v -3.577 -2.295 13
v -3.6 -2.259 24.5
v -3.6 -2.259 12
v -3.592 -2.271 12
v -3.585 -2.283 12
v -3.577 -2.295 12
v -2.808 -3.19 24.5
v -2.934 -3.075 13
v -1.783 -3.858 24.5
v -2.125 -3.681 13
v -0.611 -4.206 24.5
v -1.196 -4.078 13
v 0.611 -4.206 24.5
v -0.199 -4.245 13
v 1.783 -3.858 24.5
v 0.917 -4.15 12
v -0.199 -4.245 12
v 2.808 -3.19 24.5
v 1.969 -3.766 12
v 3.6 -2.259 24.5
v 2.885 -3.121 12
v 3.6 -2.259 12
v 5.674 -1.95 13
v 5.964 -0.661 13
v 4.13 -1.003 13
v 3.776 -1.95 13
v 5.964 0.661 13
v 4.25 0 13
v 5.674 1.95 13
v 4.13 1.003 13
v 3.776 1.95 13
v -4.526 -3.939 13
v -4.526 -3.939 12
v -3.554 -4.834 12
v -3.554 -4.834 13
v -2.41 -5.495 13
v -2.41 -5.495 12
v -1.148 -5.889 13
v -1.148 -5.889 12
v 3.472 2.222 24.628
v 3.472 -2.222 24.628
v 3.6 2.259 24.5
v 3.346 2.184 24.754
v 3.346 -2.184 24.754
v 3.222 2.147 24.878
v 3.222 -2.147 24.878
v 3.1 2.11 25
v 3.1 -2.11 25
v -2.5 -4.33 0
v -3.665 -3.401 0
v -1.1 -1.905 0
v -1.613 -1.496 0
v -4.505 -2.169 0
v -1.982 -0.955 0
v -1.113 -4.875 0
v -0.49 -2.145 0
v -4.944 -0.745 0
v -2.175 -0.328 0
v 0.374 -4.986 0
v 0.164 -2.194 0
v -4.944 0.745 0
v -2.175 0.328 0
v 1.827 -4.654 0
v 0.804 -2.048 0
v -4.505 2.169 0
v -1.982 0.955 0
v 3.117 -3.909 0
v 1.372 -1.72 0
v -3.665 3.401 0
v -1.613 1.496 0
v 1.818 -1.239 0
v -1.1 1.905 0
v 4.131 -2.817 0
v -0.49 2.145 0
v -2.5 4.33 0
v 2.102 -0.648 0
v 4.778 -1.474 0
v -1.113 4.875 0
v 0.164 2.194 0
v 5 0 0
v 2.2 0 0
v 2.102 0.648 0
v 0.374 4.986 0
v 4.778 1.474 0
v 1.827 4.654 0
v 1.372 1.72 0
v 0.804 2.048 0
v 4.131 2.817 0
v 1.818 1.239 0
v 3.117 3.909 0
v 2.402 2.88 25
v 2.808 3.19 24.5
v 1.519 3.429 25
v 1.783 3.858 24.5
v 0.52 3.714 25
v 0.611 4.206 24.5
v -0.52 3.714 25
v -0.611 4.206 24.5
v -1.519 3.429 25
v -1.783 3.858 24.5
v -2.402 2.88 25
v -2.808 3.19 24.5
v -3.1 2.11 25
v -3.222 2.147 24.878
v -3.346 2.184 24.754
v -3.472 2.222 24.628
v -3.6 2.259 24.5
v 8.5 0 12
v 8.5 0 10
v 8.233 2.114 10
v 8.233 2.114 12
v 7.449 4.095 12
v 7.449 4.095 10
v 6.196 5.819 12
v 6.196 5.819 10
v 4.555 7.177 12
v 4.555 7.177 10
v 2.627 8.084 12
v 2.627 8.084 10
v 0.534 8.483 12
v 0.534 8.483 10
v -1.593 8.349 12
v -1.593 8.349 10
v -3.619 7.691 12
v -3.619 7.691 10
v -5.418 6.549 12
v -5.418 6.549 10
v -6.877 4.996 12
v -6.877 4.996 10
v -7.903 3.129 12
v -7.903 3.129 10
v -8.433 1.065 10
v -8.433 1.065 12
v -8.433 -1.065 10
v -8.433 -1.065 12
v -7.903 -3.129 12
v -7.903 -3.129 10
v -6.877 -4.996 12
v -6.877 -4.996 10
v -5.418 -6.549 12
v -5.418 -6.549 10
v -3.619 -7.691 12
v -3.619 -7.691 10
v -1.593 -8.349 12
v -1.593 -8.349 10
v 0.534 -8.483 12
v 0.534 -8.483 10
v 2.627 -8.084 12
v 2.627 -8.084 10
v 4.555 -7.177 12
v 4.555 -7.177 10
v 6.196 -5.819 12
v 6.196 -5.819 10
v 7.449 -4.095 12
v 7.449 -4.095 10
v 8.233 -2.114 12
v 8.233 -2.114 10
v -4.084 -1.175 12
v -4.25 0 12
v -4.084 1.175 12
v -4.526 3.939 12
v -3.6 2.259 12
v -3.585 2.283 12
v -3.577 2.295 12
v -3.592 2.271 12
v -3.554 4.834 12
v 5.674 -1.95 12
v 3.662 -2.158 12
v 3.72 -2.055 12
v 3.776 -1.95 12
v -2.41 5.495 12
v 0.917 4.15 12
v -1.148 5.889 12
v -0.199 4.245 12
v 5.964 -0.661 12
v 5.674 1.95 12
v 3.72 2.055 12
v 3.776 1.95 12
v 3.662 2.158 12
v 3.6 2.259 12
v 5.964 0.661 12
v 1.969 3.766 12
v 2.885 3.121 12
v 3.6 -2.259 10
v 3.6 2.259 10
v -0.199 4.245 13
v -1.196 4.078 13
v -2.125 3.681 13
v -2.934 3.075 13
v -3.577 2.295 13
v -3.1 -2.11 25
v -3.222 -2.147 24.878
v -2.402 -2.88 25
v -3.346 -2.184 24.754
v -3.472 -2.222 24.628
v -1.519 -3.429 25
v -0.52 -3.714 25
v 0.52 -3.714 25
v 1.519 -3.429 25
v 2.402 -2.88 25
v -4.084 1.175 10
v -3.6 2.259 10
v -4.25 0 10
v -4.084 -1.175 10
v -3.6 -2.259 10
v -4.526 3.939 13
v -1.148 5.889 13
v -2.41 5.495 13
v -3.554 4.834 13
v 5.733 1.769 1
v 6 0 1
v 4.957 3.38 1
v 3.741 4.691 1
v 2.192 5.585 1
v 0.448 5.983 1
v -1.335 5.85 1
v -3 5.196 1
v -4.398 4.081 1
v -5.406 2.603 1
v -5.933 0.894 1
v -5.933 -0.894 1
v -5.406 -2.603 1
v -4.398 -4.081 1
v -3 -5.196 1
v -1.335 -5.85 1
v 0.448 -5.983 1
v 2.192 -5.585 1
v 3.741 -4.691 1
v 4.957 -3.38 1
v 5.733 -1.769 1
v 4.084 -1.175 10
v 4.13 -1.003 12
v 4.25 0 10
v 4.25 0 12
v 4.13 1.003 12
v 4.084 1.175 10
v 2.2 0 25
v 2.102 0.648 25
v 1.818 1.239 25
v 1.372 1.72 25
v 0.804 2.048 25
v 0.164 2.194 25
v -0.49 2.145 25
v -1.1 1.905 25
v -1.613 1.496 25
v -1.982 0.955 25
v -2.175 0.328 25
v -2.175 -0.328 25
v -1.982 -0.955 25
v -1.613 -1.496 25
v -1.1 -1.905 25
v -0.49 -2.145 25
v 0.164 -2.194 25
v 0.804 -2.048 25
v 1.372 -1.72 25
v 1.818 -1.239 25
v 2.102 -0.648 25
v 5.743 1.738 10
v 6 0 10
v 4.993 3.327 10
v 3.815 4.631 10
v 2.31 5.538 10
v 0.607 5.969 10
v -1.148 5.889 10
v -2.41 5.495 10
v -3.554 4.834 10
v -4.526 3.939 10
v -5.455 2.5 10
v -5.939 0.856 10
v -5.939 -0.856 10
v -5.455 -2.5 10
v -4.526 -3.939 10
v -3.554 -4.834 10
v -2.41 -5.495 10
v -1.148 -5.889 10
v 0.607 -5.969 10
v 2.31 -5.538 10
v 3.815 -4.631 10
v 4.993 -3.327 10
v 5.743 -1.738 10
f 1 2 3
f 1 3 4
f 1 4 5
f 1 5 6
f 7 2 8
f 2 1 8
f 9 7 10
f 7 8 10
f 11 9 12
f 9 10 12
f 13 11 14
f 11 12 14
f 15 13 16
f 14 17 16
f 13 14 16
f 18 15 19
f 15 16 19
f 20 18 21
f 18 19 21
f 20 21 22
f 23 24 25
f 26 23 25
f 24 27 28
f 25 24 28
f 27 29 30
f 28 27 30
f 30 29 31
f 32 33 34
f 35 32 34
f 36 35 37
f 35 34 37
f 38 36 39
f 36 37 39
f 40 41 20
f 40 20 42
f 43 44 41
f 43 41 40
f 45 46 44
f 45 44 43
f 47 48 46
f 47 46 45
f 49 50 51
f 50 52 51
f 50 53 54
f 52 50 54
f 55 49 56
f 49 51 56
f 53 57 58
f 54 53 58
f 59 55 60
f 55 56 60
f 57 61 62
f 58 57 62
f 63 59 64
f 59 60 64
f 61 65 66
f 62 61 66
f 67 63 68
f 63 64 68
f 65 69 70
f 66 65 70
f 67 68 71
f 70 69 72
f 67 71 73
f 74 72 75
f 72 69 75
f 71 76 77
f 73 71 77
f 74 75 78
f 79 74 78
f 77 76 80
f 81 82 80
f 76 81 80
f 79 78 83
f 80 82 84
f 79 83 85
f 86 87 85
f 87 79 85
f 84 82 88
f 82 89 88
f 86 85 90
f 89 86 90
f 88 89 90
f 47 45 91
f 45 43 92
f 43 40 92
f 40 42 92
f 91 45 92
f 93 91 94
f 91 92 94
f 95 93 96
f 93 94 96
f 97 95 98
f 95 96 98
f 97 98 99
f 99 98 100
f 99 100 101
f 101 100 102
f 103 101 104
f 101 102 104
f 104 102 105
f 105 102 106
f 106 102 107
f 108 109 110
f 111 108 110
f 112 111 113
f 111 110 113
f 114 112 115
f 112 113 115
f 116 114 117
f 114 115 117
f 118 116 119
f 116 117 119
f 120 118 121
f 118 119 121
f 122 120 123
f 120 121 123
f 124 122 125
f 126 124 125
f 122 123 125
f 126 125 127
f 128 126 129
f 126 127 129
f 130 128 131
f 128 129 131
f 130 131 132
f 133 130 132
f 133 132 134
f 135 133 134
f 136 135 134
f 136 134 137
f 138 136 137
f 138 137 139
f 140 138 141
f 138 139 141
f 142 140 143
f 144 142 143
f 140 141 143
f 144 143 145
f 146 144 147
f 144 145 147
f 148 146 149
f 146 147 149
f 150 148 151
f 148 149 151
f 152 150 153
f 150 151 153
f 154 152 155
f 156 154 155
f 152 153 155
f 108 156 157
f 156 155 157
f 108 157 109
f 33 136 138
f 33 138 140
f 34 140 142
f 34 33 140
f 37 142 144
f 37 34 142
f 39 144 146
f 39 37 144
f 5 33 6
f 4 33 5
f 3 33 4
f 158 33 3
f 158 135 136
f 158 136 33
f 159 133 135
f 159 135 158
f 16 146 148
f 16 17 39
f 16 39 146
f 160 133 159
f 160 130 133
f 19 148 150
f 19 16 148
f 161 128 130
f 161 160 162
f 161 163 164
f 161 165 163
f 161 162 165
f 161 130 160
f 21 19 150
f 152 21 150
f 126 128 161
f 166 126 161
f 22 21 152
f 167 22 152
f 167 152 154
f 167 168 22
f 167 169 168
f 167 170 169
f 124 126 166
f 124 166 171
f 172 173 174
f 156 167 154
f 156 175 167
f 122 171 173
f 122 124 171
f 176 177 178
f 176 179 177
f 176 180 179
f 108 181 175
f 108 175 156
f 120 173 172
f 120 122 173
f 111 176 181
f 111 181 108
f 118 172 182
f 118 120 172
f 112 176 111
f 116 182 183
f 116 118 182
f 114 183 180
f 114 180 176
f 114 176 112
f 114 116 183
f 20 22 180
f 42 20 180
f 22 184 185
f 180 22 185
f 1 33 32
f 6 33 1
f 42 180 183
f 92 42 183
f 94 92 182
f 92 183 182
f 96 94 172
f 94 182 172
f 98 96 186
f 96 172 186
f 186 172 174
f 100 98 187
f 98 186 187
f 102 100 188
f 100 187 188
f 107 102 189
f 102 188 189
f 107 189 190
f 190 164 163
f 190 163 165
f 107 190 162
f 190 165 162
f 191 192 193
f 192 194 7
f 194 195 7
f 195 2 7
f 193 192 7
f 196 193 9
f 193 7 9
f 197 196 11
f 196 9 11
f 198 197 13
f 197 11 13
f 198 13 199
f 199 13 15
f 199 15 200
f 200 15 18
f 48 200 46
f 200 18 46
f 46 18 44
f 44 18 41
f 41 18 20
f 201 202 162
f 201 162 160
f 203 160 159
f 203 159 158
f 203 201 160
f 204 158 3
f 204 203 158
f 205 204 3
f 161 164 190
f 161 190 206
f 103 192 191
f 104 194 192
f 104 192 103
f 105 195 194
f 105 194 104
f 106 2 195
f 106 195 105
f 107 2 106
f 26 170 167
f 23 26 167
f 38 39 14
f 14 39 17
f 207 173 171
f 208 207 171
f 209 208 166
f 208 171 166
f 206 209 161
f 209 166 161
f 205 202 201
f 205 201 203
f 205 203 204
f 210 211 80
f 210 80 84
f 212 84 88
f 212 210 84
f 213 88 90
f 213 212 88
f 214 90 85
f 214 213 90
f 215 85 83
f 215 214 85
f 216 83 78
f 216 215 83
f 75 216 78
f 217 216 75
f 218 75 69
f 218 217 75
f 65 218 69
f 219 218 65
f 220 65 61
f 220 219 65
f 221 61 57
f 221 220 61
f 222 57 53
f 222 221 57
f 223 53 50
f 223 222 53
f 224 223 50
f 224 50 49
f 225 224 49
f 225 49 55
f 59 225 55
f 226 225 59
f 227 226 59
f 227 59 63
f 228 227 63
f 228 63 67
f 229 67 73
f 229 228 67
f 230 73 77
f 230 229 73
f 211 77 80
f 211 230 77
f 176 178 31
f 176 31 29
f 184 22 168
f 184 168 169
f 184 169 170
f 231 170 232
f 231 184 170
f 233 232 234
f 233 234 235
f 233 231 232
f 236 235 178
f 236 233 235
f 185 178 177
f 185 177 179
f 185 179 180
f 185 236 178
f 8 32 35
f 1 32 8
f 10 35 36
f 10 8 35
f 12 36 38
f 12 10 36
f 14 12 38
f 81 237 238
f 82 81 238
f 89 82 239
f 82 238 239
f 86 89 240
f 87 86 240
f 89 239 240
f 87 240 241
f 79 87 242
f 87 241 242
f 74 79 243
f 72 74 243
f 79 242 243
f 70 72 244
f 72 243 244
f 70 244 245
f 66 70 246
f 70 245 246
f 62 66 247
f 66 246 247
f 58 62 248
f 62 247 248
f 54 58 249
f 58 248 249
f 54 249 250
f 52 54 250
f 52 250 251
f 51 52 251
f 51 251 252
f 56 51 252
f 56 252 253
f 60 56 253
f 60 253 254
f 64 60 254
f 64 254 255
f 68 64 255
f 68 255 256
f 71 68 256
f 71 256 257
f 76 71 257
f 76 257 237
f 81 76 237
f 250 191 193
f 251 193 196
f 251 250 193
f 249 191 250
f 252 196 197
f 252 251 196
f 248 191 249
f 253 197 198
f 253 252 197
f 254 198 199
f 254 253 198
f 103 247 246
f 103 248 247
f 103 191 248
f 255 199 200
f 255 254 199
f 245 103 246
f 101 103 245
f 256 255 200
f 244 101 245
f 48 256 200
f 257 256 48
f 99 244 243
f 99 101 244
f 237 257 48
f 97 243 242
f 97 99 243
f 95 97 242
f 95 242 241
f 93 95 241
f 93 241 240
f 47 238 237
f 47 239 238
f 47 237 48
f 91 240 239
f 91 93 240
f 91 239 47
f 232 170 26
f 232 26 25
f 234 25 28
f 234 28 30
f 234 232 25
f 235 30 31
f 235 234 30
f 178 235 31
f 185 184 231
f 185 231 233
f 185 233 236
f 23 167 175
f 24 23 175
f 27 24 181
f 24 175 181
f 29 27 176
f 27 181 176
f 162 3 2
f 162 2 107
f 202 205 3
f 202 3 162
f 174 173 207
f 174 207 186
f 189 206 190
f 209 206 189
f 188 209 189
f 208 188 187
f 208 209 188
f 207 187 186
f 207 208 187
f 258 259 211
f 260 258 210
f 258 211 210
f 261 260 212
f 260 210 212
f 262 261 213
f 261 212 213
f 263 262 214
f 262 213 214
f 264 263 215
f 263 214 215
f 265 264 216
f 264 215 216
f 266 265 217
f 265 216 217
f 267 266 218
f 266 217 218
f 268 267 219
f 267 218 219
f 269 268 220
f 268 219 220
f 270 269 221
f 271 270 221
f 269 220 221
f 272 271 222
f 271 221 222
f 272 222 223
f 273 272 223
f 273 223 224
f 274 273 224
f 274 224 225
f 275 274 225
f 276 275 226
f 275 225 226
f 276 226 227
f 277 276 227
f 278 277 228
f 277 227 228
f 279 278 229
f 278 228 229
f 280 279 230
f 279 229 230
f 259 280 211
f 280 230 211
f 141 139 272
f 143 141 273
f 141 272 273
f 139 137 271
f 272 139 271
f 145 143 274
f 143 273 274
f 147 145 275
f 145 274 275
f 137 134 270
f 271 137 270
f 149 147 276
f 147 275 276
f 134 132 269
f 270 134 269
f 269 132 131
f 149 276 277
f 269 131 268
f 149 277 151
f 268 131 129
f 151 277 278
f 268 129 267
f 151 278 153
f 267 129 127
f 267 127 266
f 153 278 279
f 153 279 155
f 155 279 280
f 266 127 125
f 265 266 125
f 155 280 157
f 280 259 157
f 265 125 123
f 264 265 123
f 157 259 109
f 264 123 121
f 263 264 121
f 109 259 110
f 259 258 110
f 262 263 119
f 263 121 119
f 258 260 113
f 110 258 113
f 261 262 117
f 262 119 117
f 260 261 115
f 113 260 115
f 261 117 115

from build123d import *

# Parameters (mm, degrees)
SKETCH_R        = 6
PAD_DEPTH       = 10
PAD001_DEPTH    = 15
SKETCH002_R     = 2.2
POCKET_DEPTH    = 25.001
PAD002_DEPTH    = 3
SKETCH004_R     = 8.5
SKETCH004_R_2   = 4.25
PAD003_DEPTH    = 2
CHAMFER_SIZE    = 0.5
CHAMFER001_SIZE = 1


with BuildPart() as part:
    # Sketch → Pad (new body)
    with BuildSketch(Plane.XY):
        Circle(SKETCH_R)
    extrude(amount=PAD_DEPTH)

    # Sketch001 (on Face3 of Pad) → Pad001 (join)
    with BuildSketch(Plane.XY.offset(10)):
        with BuildLine():
            ThreePointArc((-3.6, -2.258871), (0, -4.25), (3.6, -2.258871))
            Line((3.6, -2.258871), (3.6, 2.258871))
            ThreePointArc((3.6, 2.258871), (0, 4.25), (-3.6, 2.258871))
            Line((-3.6, -2.258871), (-3.6, 2.258871))
        make_face()
    extrude(amount=PAD001_DEPTH)

    # Sketch002 (on Face8 of Pad001) → Pocket (cut, through all)
    with BuildSketch(Plane.XY.offset(25)):
        Circle(SKETCH002_R)
    extrude(amount=-POCKET_DEPTH, mode=Mode.SUBTRACT)

    # Sketch003 (on Face3 of Pocket) → Pad002 (join)
    with BuildSketch(Plane.XY.offset(10)):
        with BuildLine():
            ThreePointArc((3.776242, -1.95), (4.25, 0), (3.776242, 1.95))
            Line((3.776242, 1.95), (5.674284, 1.95))
            ThreePointArc((5.674284, -1.95), (6, 0), (5.674284, 1.95))
            Line((3.776242, -1.95), (5.674284, -1.95))
        make_face()
        with BuildLine():
            ThreePointArc((-1.148393, 5.889074), (-3, 5.196152), (-4.525892, 3.939074))
            Line((-3.57687, 2.295321), (-4.525892, 3.939074))
            ThreePointArc((-0.199371, 4.245321), (-2.125, 3.680608), (-3.57687, 2.295321))
            Line((-1.148393, 5.889074), (-0.199371, 4.245321))
        make_face()
        with BuildLine():
            ThreePointArc((-4.525892, -3.939074), (-3, -5.196152), (-1.148393, -5.889074))
            Line((-1.148393, -5.889074), (-0.199371, -4.245321))
            ThreePointArc((-3.57687, -2.295321), (-2.125, -3.680608), (-0.199371, -4.245321))
            Line((-4.525892, -3.939074), (-3.57687, -2.295321))
        make_face()
    extrude(amount=PAD002_DEPTH)

    # Sketch004 (on Face4 of Pad002) → Pad003 (join)
    with BuildSketch(Plane.XY.offset(10)):
        Circle(SKETCH004_R)
        Circle(SKETCH004_R_2, mode=Mode.SUBTRACT)
    extrude(amount=PAD003_DEPTH)

    # Chamfer
    chamfer_edges = [part.edges().sort_by_distance(p)[0] for p in [
        (-3.6, 0, 25),
        (0, 4.25, 25),
        (3.6, 0, 25),
        (0, -4.25, 25),
    ]]
    chamfer(chamfer_edges, length=CHAMFER_SIZE)

    # Chamfer001
    chamfer001_edges = [part.edges().sort_by_distance(p)[0] for p in [
        (-6, 0, 0),
    ]]
    chamfer(chamfer001_edges, length=CHAMFER001_SIZE)


solid = part.part
